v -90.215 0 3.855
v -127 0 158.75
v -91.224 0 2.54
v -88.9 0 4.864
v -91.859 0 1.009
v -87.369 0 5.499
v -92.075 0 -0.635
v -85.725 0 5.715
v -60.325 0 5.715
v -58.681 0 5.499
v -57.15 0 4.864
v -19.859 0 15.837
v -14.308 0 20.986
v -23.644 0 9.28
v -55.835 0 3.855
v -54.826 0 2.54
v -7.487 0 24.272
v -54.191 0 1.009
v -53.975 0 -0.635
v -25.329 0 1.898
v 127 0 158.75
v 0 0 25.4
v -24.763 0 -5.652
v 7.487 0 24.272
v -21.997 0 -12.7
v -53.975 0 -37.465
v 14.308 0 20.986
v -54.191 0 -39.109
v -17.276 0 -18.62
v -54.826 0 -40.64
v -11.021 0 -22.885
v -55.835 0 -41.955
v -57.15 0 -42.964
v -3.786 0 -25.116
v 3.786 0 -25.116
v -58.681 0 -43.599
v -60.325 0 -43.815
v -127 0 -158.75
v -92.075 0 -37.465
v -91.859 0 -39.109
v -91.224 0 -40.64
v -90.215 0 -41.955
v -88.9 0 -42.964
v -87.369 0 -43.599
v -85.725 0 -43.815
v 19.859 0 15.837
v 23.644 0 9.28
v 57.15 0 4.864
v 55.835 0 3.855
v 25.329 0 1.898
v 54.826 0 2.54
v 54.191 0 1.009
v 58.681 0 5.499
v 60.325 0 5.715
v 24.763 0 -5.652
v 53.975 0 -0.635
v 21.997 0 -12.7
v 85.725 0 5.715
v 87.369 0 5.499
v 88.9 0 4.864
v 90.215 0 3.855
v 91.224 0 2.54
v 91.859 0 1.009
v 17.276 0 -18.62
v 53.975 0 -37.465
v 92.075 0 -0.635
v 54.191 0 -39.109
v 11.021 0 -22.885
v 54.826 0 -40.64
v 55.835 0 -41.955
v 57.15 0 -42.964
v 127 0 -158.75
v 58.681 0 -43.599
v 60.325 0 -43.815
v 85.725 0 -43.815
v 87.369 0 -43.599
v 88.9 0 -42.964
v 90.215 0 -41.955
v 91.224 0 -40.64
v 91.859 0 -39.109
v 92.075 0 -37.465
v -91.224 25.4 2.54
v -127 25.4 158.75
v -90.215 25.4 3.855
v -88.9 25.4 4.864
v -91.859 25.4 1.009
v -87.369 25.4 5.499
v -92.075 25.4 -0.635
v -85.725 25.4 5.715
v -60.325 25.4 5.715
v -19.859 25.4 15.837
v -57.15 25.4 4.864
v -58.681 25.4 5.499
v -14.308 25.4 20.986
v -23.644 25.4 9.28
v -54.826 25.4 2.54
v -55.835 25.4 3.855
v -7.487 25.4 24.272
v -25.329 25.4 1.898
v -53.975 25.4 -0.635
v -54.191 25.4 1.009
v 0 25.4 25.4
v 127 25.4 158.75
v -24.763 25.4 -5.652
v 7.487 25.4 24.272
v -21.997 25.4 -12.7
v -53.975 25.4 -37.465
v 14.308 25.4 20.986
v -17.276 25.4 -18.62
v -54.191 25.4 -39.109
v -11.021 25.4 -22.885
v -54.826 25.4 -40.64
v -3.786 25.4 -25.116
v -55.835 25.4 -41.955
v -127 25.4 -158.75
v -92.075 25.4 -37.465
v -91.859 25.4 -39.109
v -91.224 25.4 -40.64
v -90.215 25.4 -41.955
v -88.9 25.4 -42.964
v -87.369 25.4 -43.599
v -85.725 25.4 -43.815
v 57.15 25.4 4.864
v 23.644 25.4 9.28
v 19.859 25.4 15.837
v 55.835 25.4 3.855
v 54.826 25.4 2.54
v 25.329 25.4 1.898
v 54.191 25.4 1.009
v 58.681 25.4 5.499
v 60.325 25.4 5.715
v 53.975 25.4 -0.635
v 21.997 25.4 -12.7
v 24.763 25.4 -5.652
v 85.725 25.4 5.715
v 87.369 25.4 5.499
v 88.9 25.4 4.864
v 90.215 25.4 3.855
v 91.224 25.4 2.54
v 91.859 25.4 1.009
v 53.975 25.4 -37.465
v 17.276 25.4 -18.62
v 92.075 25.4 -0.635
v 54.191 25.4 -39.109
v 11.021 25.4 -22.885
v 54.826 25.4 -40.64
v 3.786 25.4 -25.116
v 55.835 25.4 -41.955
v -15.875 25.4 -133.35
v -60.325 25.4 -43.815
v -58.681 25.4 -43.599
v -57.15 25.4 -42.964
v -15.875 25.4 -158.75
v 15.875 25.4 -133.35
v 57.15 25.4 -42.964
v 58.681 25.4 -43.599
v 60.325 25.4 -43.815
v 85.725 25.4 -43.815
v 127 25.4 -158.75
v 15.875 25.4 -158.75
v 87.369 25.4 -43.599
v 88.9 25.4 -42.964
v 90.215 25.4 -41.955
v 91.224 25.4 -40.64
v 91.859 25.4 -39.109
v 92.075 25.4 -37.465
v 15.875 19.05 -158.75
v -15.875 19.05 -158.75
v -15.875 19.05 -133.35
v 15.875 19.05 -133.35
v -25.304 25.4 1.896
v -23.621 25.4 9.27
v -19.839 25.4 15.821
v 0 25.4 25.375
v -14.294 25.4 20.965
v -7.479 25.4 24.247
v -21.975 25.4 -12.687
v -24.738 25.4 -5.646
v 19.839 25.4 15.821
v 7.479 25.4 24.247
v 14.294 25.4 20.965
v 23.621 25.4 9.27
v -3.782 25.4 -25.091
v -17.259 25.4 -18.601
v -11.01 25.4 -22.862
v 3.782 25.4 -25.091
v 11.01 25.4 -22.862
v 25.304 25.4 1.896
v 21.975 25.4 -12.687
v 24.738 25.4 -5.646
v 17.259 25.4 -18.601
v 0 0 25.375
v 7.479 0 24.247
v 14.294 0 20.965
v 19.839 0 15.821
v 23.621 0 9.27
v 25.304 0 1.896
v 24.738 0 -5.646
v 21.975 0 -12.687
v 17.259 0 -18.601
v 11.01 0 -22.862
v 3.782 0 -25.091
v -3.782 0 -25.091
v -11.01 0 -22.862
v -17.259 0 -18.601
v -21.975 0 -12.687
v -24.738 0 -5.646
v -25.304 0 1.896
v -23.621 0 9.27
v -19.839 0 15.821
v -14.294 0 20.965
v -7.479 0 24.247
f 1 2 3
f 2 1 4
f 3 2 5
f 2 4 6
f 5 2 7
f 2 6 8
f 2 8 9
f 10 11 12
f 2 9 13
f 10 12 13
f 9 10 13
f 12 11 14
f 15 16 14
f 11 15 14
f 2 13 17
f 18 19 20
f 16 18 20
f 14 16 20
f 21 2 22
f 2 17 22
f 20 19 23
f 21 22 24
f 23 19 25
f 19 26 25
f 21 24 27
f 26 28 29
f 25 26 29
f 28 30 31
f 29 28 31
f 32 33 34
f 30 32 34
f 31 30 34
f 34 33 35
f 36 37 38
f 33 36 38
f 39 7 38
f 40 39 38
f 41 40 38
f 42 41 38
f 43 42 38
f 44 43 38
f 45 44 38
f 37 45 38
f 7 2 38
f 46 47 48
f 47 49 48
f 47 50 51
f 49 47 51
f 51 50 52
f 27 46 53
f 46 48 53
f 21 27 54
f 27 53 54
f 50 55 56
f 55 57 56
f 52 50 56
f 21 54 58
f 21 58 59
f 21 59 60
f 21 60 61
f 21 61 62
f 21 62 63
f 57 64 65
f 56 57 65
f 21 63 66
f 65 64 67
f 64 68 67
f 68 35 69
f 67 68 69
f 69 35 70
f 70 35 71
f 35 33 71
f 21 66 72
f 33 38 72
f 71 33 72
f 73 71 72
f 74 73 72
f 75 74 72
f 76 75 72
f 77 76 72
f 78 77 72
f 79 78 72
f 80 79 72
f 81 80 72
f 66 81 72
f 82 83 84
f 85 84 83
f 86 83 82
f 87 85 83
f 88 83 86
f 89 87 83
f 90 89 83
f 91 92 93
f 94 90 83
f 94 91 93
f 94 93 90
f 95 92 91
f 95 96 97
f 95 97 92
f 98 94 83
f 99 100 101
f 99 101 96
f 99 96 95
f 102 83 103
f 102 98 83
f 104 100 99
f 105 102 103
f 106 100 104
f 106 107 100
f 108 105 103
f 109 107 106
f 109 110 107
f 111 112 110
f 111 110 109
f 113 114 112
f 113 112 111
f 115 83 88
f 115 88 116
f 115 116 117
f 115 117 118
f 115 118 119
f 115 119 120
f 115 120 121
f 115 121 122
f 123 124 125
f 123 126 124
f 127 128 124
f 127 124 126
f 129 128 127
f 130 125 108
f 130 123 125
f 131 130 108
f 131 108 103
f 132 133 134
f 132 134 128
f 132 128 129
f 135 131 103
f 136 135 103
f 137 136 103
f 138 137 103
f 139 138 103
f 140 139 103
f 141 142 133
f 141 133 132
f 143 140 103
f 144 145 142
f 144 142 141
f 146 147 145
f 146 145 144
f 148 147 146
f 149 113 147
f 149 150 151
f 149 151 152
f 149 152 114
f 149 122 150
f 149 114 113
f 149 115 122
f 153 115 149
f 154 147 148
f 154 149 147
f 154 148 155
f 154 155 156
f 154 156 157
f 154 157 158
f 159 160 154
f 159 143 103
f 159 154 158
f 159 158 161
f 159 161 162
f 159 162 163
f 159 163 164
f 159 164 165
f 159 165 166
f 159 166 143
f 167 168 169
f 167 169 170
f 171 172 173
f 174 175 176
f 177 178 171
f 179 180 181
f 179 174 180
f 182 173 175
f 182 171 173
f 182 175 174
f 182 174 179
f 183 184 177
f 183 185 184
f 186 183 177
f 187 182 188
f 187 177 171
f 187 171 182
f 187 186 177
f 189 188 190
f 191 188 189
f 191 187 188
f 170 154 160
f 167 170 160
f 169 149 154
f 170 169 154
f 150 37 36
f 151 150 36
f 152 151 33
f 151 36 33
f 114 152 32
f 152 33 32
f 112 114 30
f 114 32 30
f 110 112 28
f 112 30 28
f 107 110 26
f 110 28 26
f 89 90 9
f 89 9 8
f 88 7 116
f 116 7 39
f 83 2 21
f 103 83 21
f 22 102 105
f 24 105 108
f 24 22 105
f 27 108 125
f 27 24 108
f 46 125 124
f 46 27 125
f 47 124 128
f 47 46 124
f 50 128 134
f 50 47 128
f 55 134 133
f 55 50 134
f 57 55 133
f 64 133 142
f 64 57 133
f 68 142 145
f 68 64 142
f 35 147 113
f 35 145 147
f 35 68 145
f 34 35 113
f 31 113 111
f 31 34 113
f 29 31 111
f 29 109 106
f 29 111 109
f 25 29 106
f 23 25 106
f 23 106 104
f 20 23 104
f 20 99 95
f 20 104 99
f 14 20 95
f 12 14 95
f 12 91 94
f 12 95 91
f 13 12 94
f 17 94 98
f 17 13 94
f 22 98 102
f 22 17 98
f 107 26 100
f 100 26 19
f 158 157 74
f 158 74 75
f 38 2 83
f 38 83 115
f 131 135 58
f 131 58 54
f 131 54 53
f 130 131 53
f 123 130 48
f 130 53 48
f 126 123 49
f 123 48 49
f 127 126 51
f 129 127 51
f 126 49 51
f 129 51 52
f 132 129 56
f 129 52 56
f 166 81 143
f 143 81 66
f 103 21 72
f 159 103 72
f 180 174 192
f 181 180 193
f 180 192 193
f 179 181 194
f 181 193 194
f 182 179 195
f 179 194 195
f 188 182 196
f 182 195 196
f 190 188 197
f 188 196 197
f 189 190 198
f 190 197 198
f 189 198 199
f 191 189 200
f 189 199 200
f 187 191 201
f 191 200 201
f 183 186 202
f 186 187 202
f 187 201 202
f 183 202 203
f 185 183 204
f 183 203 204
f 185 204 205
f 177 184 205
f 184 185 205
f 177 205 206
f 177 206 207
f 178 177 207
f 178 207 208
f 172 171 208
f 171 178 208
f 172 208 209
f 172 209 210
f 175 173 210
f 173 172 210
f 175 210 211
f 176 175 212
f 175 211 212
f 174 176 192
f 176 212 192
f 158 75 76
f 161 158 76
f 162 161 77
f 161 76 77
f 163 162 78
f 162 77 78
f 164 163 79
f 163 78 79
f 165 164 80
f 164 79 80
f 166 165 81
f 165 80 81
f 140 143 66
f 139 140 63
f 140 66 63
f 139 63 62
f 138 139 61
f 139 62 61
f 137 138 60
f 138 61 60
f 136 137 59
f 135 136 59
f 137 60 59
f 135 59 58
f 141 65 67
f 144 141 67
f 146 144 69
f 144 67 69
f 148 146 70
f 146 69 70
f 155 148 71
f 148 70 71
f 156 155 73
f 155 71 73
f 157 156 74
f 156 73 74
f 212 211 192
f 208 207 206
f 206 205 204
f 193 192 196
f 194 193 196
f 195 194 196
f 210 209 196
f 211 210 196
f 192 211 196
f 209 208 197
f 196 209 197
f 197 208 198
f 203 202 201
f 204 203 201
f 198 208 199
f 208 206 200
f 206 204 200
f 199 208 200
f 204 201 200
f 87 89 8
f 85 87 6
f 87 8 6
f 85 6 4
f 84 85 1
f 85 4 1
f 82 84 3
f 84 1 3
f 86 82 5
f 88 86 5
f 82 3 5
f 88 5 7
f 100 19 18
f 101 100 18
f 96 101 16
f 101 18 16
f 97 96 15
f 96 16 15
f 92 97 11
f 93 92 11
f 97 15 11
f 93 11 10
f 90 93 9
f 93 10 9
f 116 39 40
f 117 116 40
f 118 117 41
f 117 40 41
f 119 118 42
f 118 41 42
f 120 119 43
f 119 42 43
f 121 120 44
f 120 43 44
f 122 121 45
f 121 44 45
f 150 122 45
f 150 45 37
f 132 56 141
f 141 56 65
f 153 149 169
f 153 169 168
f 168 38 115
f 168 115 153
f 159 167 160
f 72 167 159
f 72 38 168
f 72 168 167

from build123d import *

# Parameters (mm, degrees)
SKETCH2_W          = 254
SKETCH2_H          = 317.5
EXTRUDE1_DEPTH     = 25.4
SKETCH3_R          = 25.4
SKETCH3_R_2        = 25.3746
CUT_EXTRUDE1_DEPTH = 205.879775722
SKETCH4_W          = 31.75
SKETCH4_H          = 64.584514738
CUT_EXTRUDE2_DEPTH = 6.35


with BuildPart() as part:
    # Sketch2 → Extrude1 (new body)
    with BuildSketch(Plane(origin=(0, 0, 0), x_dir=(1, 0, 0), z_dir=(0, 1, 0))):
        Rectangle(SKETCH2_W, SKETCH2_H)
        with BuildLine():
            Line((60.325, 43.815), (85.725, 43.815))
            ThreePointArc((85.725, 43.815), (90.215128061, 41.955128061), (92.075, 37.465))
            Line((92.075, 37.465), (92.075, 0.635))
            ThreePointArc((92.075, 0.635), (90.215128061, -3.855128061), (85.725, -5.715))
            Line((85.725, -5.715), (60.325, -5.715))
            ThreePointArc((60.325, -5.715), (55.834871939, -3.855128061), (53.975, 0.635))
            Line((53.975, 0.635), (53.975, 37.465))
            ThreePointArc((53.975, 37.465), (55.834871939, 41.955128061), (60.325, 43.815))
        make_face(mode=Mode.SUBTRACT)
        with BuildLine():
            Line((-53.975, 37.465), (-53.975, 0.635))
            ThreePointArc((-53.975, 0.635), (-55.834871939, -3.855128061), (-60.325, -5.715))
            Line((-60.325, -5.715), (-85.725, -5.715))
            ThreePointArc((-85.725, -5.715), (-90.215128061, -3.855128061), (-92.075, 0.635))
            Line((-92.075, 0.635), (-92.075, 37.465))
            ThreePointArc((-92.075, 37.465), (-90.215128061, 41.955128061), (-85.725, 43.815))
            Line((-85.725, 43.815), (-60.325, 43.815))
            ThreePointArc((-60.325, 43.815), (-55.834871939, 41.955128061), (-53.975, 37.465))
        make_face(mode=Mode.SUBTRACT)
    extrude(amount=EXTRUDE1_DEPTH)

    # Sketch3 → Cut-Extrude1 (cut, through all)
    with BuildSketch(Plane(origin=(0, 0, 0), x_dir=(1, 0, 0), z_dir=(0, 1, 0))):
        with Locations(Location((0, 0, 0), (0, 0, 270))):
            Circle(SKETCH3_R)
        with Locations(Location((0, 0, 0), (0, 0, 270))):
            Circle(SKETCH3_R_2, mode=Mode.SUBTRACT)
    extrude(amount=CUT_EXTRUDE1_DEPTH, mode=Mode.SUBTRACT)


with BuildPart() as cut_extrude1_piece_1:
    # of the separate pieces the step leaves, piece 1, a body of its own (cut_extrude1_pieces)
    add(part.part.solids().sort_by_distance((127, 0, -158.75))[0])

    # Sketch4 → Cut-Extrude2 (cut)
    with BuildSketch(Plane(origin=(0, 25.4, 0), x_dir=(1, 0, 0), z_dir=(0, 1, 0))):
        with Locations((0, 165.642257369)):
            Rectangle(SKETCH4_W, SKETCH4_H)
    extrude(amount=-CUT_EXTRUDE2_DEPTH, mode=Mode.SUBTRACT)


with BuildPart() as cut_extrude1_piece_2:
    # of the separate pieces the step leaves, piece 2, a body of its own (cut_extrude1_pieces)
    add(part.part.solids().sort_by_distance((0, 0, 25.3746))[0])


solid = Compound([cut_extrude1_piece_1.part, cut_extrude1_piece_2.part])
